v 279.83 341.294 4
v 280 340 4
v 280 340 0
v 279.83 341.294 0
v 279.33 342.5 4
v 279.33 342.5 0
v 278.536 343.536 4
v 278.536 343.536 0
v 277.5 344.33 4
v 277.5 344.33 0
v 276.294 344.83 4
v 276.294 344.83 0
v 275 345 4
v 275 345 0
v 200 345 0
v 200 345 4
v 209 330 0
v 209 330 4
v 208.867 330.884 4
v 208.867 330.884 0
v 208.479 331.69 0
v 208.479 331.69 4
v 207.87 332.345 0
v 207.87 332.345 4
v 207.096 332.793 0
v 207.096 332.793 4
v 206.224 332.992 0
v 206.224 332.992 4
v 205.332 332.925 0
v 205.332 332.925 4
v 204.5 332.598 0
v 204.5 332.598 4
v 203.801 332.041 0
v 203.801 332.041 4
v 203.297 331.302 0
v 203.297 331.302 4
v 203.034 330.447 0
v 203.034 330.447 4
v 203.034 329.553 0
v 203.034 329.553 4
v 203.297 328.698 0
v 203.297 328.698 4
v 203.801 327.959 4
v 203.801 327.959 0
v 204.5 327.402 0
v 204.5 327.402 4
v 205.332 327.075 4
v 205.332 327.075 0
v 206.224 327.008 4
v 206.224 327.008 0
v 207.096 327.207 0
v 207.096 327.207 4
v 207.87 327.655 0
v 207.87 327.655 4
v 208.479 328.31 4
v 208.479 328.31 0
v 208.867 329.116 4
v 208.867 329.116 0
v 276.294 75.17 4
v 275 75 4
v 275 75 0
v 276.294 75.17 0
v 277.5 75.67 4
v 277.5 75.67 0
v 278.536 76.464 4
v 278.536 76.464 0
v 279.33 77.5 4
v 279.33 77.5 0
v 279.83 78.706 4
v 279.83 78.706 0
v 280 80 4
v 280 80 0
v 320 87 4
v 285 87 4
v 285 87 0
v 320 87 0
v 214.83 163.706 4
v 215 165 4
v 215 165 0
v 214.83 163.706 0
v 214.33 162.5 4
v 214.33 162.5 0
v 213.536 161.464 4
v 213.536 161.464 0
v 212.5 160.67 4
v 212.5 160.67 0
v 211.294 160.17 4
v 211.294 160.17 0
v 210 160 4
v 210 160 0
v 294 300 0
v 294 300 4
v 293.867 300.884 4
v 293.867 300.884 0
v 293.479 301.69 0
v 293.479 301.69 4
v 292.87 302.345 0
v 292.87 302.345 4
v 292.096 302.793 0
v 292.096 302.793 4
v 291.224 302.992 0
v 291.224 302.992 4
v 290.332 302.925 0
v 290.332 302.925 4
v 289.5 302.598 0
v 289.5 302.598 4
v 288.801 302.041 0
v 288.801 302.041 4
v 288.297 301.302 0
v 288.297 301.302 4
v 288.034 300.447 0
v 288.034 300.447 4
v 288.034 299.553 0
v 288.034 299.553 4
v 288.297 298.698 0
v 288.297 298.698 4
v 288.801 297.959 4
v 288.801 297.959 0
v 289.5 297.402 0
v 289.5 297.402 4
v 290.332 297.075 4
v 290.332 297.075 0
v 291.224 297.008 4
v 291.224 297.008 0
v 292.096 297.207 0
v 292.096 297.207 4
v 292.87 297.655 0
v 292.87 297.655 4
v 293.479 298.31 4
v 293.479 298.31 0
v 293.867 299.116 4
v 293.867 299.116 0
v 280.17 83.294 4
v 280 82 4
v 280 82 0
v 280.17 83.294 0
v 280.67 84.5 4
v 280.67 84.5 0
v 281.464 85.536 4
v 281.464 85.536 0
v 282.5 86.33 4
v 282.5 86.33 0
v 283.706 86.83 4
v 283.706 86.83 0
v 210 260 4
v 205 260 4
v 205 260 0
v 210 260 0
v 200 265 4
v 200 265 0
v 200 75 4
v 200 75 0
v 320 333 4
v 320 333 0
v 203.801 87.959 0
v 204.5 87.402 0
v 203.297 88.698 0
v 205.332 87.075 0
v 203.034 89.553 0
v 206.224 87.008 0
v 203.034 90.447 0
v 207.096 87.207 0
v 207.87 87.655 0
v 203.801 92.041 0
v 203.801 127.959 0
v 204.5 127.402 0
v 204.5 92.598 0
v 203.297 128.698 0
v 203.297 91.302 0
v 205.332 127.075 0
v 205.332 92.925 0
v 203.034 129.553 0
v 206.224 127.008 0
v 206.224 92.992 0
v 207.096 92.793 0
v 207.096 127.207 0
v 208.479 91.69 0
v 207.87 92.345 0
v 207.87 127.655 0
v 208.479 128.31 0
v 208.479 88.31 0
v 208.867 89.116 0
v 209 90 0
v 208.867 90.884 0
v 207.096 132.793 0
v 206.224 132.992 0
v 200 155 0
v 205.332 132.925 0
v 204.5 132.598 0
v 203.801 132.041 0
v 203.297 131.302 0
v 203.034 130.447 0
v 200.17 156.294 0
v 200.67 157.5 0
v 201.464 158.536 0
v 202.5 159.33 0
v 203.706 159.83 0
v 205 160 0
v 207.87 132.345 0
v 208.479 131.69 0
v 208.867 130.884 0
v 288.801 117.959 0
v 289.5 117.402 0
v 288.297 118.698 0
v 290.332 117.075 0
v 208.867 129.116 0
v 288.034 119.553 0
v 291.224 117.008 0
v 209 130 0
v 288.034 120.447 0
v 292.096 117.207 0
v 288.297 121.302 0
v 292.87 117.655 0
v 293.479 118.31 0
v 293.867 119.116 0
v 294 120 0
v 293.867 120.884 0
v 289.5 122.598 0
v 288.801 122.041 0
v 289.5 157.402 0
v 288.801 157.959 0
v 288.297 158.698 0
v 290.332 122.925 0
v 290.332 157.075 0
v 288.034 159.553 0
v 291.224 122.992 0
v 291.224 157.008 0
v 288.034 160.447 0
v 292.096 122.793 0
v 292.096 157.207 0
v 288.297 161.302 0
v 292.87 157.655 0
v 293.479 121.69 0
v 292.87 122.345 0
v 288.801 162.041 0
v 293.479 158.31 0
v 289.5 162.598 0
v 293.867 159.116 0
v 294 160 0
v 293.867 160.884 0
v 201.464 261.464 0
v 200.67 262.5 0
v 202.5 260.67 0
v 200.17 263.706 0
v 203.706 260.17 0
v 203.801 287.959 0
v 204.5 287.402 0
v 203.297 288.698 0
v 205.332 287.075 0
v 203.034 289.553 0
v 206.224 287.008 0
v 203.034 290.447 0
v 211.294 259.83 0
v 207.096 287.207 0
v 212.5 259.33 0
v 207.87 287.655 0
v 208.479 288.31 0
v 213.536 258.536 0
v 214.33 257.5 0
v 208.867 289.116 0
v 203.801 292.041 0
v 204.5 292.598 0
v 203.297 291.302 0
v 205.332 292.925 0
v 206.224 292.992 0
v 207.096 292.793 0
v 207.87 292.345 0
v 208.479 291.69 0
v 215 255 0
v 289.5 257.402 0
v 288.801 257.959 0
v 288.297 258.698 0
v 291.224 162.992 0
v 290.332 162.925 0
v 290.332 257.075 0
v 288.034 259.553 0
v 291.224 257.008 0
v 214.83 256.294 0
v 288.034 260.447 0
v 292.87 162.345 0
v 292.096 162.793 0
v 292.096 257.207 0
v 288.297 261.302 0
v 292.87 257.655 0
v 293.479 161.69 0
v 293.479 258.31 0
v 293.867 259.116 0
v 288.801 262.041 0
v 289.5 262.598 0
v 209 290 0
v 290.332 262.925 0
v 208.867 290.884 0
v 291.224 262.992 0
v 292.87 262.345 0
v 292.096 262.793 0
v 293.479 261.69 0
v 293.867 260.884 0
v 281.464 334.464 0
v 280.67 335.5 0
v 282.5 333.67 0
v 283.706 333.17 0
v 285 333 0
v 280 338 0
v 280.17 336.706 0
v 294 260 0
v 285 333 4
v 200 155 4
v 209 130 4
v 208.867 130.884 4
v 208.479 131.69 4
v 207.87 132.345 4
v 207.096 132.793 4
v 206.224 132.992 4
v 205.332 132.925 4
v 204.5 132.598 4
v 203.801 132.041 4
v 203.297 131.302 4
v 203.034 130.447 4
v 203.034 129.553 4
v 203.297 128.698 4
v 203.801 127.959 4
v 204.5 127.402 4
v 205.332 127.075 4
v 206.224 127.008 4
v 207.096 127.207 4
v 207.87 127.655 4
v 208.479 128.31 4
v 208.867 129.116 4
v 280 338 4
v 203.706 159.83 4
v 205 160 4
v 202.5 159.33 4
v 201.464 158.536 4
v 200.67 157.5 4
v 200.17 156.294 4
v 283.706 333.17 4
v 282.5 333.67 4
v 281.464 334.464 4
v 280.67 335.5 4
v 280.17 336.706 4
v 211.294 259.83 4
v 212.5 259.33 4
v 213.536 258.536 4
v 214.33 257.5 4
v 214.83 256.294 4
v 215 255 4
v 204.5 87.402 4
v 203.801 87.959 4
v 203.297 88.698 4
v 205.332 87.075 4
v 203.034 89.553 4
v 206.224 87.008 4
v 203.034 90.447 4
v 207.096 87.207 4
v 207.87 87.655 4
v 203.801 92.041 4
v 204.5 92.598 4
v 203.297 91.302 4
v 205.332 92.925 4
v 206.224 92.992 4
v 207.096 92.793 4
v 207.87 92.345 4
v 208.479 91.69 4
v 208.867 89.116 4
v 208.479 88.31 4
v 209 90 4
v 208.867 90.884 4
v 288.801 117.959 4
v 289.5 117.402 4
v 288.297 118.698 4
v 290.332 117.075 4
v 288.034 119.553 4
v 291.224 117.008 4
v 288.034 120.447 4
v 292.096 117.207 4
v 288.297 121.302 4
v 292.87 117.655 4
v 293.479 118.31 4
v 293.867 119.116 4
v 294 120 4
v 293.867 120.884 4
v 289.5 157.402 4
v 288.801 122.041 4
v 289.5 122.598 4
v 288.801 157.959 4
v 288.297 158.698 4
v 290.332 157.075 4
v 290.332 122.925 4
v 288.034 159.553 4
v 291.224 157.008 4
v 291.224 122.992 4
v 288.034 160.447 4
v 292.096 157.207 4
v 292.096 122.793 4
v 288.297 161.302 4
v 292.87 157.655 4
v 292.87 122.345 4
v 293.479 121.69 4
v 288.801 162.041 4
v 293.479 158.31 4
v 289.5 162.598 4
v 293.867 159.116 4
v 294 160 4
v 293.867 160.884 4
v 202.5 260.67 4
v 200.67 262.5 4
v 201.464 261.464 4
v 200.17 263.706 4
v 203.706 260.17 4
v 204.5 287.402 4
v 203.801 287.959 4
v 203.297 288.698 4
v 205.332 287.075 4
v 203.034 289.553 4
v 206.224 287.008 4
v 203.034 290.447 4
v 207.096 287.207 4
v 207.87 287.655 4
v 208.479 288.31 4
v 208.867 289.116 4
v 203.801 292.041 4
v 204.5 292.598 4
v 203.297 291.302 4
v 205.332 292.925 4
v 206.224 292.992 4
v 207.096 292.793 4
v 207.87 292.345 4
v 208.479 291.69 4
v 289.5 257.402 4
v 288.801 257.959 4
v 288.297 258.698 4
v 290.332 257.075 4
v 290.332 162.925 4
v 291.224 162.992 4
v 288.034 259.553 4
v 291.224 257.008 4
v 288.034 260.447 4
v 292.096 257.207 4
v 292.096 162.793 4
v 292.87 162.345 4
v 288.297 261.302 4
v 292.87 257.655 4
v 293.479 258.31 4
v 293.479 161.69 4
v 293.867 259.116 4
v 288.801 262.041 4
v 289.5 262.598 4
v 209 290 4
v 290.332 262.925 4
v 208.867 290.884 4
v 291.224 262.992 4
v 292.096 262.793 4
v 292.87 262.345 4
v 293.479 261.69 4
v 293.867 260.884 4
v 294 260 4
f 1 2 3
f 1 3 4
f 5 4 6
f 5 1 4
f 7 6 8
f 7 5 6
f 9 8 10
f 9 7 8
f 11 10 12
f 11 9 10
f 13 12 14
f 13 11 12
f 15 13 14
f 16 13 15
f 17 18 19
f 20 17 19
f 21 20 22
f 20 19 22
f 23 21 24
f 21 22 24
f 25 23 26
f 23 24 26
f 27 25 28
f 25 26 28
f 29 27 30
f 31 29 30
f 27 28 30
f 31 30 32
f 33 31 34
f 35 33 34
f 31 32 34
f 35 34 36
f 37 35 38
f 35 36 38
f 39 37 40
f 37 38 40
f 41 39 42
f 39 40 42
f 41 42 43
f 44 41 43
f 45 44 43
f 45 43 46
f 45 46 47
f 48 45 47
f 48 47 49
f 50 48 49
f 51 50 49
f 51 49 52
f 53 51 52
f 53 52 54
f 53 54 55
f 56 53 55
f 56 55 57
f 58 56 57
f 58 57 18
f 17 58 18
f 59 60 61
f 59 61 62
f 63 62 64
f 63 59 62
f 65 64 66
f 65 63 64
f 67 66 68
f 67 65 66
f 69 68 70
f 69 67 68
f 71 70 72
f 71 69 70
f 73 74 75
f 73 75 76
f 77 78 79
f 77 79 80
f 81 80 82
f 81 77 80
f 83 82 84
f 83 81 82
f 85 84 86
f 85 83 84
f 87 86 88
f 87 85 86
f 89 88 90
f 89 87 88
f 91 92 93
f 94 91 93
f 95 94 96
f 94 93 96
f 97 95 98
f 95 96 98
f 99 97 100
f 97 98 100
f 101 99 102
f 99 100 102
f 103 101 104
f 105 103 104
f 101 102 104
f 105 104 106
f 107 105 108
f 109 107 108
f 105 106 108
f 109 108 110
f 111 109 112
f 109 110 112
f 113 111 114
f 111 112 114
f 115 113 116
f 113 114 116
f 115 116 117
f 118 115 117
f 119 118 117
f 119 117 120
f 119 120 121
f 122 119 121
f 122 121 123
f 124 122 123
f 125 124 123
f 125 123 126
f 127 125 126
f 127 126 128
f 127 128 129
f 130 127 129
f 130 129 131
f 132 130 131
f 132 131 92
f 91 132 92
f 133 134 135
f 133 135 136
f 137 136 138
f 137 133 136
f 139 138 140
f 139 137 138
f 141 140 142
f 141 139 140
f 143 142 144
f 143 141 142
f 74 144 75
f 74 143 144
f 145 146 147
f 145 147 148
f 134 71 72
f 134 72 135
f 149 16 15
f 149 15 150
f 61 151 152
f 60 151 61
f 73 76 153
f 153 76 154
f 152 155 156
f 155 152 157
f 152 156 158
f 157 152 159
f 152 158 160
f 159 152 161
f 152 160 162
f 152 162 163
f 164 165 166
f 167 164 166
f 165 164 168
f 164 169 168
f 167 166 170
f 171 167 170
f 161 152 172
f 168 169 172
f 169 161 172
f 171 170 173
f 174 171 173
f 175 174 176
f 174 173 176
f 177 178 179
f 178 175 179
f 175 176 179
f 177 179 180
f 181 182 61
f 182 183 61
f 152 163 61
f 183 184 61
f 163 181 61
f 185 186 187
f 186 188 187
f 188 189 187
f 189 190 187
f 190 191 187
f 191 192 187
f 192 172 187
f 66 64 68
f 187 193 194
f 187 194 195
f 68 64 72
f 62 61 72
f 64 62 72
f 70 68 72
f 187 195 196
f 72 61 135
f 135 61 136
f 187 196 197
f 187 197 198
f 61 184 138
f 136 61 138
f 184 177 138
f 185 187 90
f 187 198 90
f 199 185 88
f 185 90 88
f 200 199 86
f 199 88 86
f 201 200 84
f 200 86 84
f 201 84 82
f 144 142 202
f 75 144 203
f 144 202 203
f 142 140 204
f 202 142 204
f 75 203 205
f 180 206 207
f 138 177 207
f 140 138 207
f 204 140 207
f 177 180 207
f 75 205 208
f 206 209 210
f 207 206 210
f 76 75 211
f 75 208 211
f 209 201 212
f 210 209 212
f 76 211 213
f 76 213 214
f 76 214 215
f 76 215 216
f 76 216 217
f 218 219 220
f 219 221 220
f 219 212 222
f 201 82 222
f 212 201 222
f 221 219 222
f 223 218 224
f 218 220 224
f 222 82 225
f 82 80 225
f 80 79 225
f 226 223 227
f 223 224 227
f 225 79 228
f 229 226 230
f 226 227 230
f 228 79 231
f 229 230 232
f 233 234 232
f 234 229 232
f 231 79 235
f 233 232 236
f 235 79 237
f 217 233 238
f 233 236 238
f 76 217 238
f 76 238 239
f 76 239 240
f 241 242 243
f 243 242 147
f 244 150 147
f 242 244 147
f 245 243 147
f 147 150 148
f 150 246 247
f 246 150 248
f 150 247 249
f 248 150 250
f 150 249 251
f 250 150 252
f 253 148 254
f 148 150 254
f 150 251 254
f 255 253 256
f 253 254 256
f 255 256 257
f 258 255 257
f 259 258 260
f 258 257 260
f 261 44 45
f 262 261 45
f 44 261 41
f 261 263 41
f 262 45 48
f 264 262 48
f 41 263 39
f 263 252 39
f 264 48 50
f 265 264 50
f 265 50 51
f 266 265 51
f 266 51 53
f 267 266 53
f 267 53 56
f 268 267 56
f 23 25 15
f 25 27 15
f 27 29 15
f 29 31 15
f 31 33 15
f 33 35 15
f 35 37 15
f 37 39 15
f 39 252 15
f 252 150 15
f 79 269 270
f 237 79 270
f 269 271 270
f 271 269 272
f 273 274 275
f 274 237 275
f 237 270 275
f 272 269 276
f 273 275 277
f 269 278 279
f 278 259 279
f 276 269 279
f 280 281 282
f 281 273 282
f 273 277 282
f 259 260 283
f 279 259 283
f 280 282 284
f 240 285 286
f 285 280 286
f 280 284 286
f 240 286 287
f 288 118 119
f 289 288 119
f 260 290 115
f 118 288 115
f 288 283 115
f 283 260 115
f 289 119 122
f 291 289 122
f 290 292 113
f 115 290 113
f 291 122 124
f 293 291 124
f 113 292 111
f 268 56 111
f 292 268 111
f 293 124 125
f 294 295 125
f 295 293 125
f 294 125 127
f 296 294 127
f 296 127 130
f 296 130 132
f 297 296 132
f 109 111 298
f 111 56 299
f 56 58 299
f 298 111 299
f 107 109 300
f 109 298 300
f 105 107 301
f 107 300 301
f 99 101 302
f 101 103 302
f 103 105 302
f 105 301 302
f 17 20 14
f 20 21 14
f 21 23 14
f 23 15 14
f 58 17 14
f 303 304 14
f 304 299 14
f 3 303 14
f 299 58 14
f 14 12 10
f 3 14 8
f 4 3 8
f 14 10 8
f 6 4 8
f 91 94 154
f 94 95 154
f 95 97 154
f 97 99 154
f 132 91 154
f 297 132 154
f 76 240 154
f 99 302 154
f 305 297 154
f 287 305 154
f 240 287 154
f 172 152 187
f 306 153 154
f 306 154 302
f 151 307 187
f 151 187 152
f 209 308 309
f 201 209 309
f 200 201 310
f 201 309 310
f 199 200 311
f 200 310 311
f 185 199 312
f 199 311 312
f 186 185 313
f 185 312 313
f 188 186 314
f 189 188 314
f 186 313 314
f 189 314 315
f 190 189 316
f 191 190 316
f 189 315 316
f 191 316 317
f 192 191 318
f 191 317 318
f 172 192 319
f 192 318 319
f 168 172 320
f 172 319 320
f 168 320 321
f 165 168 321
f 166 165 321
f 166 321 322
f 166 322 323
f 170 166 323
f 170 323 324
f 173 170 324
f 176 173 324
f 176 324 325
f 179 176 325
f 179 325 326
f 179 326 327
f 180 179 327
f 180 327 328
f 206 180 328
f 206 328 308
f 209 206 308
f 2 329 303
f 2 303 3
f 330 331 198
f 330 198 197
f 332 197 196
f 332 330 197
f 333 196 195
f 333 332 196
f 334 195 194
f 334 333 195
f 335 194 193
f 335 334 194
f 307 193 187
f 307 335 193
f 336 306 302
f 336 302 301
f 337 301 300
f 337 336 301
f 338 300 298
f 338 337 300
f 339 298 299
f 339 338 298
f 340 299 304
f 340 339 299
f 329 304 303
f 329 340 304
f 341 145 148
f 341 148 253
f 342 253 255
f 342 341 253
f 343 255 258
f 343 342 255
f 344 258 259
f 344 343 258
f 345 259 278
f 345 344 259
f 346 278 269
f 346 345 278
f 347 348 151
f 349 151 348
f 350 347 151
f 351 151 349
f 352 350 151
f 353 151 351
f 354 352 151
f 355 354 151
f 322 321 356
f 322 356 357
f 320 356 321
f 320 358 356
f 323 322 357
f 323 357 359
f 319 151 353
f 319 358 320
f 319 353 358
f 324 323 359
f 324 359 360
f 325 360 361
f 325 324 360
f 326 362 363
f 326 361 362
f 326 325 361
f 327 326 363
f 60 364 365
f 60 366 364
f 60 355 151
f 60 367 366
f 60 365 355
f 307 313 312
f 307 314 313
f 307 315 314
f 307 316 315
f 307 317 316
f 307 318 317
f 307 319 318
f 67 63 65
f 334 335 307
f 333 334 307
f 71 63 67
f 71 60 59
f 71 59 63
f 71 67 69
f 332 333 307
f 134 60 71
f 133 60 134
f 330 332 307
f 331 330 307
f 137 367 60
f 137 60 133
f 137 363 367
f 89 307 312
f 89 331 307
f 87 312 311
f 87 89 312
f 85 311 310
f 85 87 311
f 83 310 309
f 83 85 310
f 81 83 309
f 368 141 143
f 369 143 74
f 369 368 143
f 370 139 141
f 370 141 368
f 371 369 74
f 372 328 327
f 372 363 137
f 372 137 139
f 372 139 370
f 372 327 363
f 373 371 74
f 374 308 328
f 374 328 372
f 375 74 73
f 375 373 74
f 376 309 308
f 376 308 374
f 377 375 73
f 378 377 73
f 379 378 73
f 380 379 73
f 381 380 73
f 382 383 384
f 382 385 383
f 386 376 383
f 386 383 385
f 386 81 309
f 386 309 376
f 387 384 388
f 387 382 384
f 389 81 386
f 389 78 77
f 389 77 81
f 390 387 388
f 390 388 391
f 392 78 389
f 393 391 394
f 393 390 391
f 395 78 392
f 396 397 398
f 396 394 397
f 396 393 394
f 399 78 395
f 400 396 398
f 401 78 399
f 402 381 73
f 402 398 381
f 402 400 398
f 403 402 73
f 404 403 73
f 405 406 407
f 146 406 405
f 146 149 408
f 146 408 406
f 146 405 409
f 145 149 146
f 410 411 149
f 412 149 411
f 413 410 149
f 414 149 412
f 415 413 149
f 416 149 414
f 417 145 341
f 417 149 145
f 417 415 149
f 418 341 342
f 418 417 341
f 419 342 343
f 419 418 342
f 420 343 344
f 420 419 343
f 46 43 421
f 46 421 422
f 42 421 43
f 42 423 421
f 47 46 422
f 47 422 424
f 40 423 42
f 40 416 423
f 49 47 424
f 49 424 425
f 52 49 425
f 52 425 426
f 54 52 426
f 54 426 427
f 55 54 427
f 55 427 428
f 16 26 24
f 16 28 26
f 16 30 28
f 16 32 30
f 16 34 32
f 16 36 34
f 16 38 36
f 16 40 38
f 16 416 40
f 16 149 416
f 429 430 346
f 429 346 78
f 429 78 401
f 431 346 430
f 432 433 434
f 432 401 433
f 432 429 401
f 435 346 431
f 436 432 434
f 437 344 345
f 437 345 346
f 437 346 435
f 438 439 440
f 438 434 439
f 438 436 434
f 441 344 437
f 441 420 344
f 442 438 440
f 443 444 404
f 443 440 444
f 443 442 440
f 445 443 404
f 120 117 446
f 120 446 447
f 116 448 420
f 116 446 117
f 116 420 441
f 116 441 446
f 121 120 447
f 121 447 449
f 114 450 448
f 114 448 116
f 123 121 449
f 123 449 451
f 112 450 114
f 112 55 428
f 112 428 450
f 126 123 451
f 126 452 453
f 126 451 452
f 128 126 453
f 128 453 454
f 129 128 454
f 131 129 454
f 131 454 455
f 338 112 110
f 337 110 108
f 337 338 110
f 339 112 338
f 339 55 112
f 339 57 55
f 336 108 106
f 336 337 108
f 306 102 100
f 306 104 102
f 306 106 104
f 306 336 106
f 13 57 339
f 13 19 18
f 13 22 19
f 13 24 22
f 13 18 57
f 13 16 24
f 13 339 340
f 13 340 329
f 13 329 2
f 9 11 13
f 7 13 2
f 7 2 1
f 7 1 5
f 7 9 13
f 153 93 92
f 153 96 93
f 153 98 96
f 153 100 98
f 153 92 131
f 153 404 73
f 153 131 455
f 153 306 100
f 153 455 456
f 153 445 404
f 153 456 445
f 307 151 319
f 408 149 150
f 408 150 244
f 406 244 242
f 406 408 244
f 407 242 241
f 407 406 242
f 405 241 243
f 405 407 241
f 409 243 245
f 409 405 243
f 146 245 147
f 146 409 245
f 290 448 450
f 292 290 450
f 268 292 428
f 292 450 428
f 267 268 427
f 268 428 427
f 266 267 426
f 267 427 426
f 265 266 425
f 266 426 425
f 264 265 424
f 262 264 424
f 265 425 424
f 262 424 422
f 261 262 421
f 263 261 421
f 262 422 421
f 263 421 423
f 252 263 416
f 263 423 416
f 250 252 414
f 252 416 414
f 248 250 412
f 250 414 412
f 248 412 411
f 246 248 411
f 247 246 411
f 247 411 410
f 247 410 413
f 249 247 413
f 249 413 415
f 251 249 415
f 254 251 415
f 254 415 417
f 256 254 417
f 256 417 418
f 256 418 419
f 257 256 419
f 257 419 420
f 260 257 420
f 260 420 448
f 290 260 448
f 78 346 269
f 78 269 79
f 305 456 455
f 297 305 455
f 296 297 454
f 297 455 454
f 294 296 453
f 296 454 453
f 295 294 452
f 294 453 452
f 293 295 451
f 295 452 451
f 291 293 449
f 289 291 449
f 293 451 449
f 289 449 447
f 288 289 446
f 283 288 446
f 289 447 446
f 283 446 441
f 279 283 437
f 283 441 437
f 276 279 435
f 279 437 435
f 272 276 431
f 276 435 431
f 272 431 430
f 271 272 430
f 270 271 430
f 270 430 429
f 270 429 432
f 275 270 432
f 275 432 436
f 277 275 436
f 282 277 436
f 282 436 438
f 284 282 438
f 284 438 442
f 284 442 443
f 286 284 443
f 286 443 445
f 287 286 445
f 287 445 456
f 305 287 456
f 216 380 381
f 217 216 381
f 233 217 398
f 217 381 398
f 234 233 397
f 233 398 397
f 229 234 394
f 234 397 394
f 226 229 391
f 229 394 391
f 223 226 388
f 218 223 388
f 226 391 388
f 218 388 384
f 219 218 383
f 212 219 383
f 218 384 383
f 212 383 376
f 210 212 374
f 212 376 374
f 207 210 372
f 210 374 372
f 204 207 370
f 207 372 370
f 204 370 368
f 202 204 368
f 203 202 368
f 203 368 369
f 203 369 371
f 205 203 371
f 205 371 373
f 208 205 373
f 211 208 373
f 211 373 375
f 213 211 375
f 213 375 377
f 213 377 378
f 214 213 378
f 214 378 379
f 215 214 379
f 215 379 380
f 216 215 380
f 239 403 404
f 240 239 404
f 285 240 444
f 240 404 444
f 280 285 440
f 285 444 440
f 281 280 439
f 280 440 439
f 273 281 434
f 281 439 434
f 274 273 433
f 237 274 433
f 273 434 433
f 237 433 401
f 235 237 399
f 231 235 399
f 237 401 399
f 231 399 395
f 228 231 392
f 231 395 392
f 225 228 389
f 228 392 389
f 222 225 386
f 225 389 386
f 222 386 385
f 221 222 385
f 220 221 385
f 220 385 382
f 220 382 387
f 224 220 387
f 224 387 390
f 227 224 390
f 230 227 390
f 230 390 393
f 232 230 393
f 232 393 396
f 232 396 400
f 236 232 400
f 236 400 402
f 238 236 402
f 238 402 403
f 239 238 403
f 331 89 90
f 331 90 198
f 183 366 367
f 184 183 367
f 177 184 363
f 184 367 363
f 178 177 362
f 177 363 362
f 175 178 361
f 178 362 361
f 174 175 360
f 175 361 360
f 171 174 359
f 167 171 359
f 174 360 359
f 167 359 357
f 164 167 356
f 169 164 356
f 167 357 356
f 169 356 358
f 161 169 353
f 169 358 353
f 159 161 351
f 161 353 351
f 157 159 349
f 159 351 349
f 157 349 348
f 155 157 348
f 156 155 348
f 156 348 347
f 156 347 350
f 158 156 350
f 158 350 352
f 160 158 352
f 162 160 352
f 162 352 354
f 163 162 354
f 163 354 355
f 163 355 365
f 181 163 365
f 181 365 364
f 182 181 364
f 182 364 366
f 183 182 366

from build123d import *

# Parameters (mm, degrees)
F0_W      = 320
F0_H      = 420
F1_DEPTH  = 4
F3_DEPTH  = 4
F4_R      = 3
F5_DEPTH  = 25
F6_R      = 3
F7_DEPTH  = 25
F8_R      = 3
F9_DEPTH  = 25
F11_DEPTH = 25
F13_DEPTH = 25


with BuildPart() as f1:
    # F0 (on Top) → F1 (new body)
    with BuildSketch(Plane.XY):
        with Locations((160, 210)):
            Rectangle(F0_W, F0_H)
    extrude(amount=F1_DEPTH)

    # F2 (on face) → F3 (cut, through all)
    with BuildSketch(Plane.XY.offset(4)):
        Polygon((320, 420), (290, 420), (320, 360), align=None)
        Polygon((320, 60), (290, 0), (320, 0), align=None)
        with BuildLine():
            Line((113, 360), (213, 360))
            ThreePointArc((213, 360), (216.535534, 361.464466), (218, 365))
            Line((218, 365), (218, 403))
            ThreePointArc((218, 403), (216.535534, 406.535534), (213, 408))
            Line((213, 408), (113, 408))
            ThreePointArc((113, 408), (109.464466, 406.535534), (108, 403))
            Line((108, 403), (108, 365))
            ThreePointArc((108, 365), (109.464466, 361.464466), (113, 360))
        make_face()
        with BuildLine():
            Line((113, 12), (213, 12))
            ThreePointArc((213, 12), (216.535534, 13.464466), (218, 17))
            Line((218, 17), (218, 55))
            ThreePointArc((218, 55), (216.535534, 58.535534), (213, 60))
            Line((213, 60), (113, 60))
            ThreePointArc((113, 60), (109.464466, 58.535534), (108, 55))
            Line((108, 55), (108, 17))
            ThreePointArc((108, 17), (109.464466, 13.464466), (113, 12))
        make_face()
        Polygon((0, 420), (0, 210), (50, 420), align=None)
        Polygon((50, 0), (0, 210), (0, 0), align=None)
    extrude(amount=-F3_DEPTH, mode=Mode.SUBTRACT)

    # F4 (on face) → F5 (cut)
    with BuildSketch(Plane.XY.offset(4)):
        with Locations((67, 6)):
            Circle(F4_R)
        with Locations((97, 6)):
            Circle(F4_R)
        with Locations((127, 6)):
            Circle(F4_R)
        with Locations((157, 6)):
            Circle(F4_R)
        with Locations((187, 6)):
            Circle(F4_R)
        with Locations((217, 6)):
            Circle(F4_R)
        with Locations((247, 6)):
            Circle(F4_R)
        with Locations((277, 6)):
            Circle(F4_R)
        with Locations((64, 66)):
            Circle(F4_R)
        with Locations((94, 66)):
            Circle(F4_R)
        with Locations((124, 66)):
            Circle(F4_R)
        with Locations((220, 66)):
            Circle(F4_R)
        with Locations((250, 66)):
            Circle(F4_R)
        with Locations((280, 66)):
            Circle(F4_R)
        with Locations((310, 66)):
            Circle(F4_R)
        with Locations((67, 414)):
            Circle(F4_R)
        with Locations((64, 354)):
            Circle(F4_R)
        with Locations((97, 414)):
            Circle(F4_R)
        with Locations((310, 354)):
            Circle(F4_R)
        with Locations((277, 414)):
            Circle(F4_R)
        with Locations((94, 354)):
            Circle(F4_R)
        with Locations((220, 354)):
            Circle(F4_R)
        with Locations((280, 354)):
            Circle(F4_R)
        with Locations((124, 354)):
            Circle(F4_R)
        with Locations((127, 414)):
            Circle(F4_R)
        with Locations((250, 354)):
            Circle(F4_R)
        with Locations((157, 414)):
            Circle(F4_R)
        with Locations((187, 414)):
            Circle(F4_R)
        with Locations((217, 414)):
            Circle(F4_R)
        with Locations((247, 414)):
            Circle(F4_R)
    extrude(amount=-F5_DEPTH, mode=Mode.SUBTRACT)

    # F6 (on face) → F7 (cut)
    with BuildSketch(Plane.XY.offset(4)):
        with Locations((121, 90)):
            Circle(F6_R)
        with Locations((121, 130)):
            Circle(F6_R)
        with Locations((121, 170)):
            Circle(F6_R)
        with Locations((206, 90)):
            Circle(F6_R)
        with Locations((206, 130)):
            Circle(F6_R)
        with Locations((206, 170)):
            Circle(F6_R)
        with Locations((291, 80)):
            Circle(F6_R)
        with Locations((291, 120)):
            Circle(F6_R)
        with Locations((291, 160)):
            Circle(F6_R)
        with Locations((121, 330)):
            Circle(F6_R)
        with Locations((121, 290)):
            Circle(F6_R)
        with Locations((206, 330)):
            Circle(F6_R)
        with Locations((206, 250)):
            Circle(F6_R)
        with Locations((291, 340)):
            Circle(F6_R)
        with Locations((121, 250)):
            Circle(F6_R)
        with Locations((206, 290)):
            Circle(F6_R)
        with Locations((291, 300)):
            Circle(F6_R)
        with Locations((291, 260)):
            Circle(F6_R)
    extrude(amount=-F7_DEPTH, mode=Mode.SUBTRACT)

    # F8 (on face) → F9 (cut)
    with BuildSketch(Plane.XY.offset(4)):
        with Locations((15, 210)):
            Circle(F8_R)
        with Locations((45, 210)):
            Circle(F8_R)
    extrude(amount=-F9_DEPTH, mode=Mode.SUBTRACT)

    # F10 (on face) → F11 (intersect)
    with BuildSketch(Plane.XY.offset(4)):
        with BuildLine():
            Line((87, 350), (87, 355))
            ThreePointArc((87, 355), (85.535534, 358.535534), (82, 360))
            Line((82, 360), (57, 360))
            ThreePointArc((57, 360), (53.464466, 358.535534), (52, 355))
            Line((52, 355), (52, 340))
            ThreePointArc((52, 340), (50.535534, 336.464466), (47, 335))
            Line((47, 335), (0, 335))
            Line((0, 335), (0, 210))
            Line((0, 210), (0, 85))
            Line((0, 85), (47, 85))
            ThreePointArc((47, 85), (50.535534, 83.535534), (52, 80))
            Line((52, 80), (52, 65))
            ThreePointArc((52, 65), (53.464466, 61.464466), (57, 60))
            Line((57, 60), (82, 60))
            ThreePointArc((82, 60), (85.535534, 61.464466), (87, 65))
            Line((87, 65), (87, 70))
            ThreePointArc((87, 70), (88.464466, 73.535534), (92, 75))
            Line((92, 75), (275, 75))
            ThreePointArc((275, 75), (278.535534, 76.464466), (280, 80))
            Line((280, 80), (280, 82))
            ThreePointArc((280, 82), (281.464466, 85.535534), (285, 87))
            Line((285, 87), (320, 87))
            Line((320, 87), (320, 210))
            Line((320, 210), (320, 333))
            Line((320, 333), (285, 333))
            ThreePointArc((285, 333), (281.464466, 334.464466), (280, 338))
            Line((280, 338), (280, 340))
            ThreePointArc((280, 340), (278.535534, 343.535534), (275, 345))
            Line((275, 345), (92, 345))
            ThreePointArc((92, 345), (88.464466, 346.464466), (87, 350))
        make_face()
    extrude(amount=-F11_DEPTH, mode=Mode.INTERSECT)

    # F12 (on face) → F13 (intersect)
    with BuildSketch(Plane.XY.offset(4)):
        with BuildLine():
            Line((320, 75), (320, 345))
            Line((320, 345), (200, 345))
            Line((200, 345), (200, 265))
            ThreePointArc((200, 265), (201.464466, 261.464466), (205, 260))
            Line((205, 260), (210, 260))
            ThreePointArc((210, 260), (213.535534, 258.535534), (215, 255))
            Line((215, 255), (215, 165))
            ThreePointArc((215, 165), (213.535534, 161.464466), (210, 160))
            Line((210, 160), (205, 160))
            ThreePointArc((205, 160), (201.464466, 158.535534), (200, 155))
            Line((200, 155), (200, 75))
            Line((200, 75), (320, 75))
        make_face()
    extrude(amount=-F13_DEPTH, mode=Mode.INTERSECT)


solid = f1.part
